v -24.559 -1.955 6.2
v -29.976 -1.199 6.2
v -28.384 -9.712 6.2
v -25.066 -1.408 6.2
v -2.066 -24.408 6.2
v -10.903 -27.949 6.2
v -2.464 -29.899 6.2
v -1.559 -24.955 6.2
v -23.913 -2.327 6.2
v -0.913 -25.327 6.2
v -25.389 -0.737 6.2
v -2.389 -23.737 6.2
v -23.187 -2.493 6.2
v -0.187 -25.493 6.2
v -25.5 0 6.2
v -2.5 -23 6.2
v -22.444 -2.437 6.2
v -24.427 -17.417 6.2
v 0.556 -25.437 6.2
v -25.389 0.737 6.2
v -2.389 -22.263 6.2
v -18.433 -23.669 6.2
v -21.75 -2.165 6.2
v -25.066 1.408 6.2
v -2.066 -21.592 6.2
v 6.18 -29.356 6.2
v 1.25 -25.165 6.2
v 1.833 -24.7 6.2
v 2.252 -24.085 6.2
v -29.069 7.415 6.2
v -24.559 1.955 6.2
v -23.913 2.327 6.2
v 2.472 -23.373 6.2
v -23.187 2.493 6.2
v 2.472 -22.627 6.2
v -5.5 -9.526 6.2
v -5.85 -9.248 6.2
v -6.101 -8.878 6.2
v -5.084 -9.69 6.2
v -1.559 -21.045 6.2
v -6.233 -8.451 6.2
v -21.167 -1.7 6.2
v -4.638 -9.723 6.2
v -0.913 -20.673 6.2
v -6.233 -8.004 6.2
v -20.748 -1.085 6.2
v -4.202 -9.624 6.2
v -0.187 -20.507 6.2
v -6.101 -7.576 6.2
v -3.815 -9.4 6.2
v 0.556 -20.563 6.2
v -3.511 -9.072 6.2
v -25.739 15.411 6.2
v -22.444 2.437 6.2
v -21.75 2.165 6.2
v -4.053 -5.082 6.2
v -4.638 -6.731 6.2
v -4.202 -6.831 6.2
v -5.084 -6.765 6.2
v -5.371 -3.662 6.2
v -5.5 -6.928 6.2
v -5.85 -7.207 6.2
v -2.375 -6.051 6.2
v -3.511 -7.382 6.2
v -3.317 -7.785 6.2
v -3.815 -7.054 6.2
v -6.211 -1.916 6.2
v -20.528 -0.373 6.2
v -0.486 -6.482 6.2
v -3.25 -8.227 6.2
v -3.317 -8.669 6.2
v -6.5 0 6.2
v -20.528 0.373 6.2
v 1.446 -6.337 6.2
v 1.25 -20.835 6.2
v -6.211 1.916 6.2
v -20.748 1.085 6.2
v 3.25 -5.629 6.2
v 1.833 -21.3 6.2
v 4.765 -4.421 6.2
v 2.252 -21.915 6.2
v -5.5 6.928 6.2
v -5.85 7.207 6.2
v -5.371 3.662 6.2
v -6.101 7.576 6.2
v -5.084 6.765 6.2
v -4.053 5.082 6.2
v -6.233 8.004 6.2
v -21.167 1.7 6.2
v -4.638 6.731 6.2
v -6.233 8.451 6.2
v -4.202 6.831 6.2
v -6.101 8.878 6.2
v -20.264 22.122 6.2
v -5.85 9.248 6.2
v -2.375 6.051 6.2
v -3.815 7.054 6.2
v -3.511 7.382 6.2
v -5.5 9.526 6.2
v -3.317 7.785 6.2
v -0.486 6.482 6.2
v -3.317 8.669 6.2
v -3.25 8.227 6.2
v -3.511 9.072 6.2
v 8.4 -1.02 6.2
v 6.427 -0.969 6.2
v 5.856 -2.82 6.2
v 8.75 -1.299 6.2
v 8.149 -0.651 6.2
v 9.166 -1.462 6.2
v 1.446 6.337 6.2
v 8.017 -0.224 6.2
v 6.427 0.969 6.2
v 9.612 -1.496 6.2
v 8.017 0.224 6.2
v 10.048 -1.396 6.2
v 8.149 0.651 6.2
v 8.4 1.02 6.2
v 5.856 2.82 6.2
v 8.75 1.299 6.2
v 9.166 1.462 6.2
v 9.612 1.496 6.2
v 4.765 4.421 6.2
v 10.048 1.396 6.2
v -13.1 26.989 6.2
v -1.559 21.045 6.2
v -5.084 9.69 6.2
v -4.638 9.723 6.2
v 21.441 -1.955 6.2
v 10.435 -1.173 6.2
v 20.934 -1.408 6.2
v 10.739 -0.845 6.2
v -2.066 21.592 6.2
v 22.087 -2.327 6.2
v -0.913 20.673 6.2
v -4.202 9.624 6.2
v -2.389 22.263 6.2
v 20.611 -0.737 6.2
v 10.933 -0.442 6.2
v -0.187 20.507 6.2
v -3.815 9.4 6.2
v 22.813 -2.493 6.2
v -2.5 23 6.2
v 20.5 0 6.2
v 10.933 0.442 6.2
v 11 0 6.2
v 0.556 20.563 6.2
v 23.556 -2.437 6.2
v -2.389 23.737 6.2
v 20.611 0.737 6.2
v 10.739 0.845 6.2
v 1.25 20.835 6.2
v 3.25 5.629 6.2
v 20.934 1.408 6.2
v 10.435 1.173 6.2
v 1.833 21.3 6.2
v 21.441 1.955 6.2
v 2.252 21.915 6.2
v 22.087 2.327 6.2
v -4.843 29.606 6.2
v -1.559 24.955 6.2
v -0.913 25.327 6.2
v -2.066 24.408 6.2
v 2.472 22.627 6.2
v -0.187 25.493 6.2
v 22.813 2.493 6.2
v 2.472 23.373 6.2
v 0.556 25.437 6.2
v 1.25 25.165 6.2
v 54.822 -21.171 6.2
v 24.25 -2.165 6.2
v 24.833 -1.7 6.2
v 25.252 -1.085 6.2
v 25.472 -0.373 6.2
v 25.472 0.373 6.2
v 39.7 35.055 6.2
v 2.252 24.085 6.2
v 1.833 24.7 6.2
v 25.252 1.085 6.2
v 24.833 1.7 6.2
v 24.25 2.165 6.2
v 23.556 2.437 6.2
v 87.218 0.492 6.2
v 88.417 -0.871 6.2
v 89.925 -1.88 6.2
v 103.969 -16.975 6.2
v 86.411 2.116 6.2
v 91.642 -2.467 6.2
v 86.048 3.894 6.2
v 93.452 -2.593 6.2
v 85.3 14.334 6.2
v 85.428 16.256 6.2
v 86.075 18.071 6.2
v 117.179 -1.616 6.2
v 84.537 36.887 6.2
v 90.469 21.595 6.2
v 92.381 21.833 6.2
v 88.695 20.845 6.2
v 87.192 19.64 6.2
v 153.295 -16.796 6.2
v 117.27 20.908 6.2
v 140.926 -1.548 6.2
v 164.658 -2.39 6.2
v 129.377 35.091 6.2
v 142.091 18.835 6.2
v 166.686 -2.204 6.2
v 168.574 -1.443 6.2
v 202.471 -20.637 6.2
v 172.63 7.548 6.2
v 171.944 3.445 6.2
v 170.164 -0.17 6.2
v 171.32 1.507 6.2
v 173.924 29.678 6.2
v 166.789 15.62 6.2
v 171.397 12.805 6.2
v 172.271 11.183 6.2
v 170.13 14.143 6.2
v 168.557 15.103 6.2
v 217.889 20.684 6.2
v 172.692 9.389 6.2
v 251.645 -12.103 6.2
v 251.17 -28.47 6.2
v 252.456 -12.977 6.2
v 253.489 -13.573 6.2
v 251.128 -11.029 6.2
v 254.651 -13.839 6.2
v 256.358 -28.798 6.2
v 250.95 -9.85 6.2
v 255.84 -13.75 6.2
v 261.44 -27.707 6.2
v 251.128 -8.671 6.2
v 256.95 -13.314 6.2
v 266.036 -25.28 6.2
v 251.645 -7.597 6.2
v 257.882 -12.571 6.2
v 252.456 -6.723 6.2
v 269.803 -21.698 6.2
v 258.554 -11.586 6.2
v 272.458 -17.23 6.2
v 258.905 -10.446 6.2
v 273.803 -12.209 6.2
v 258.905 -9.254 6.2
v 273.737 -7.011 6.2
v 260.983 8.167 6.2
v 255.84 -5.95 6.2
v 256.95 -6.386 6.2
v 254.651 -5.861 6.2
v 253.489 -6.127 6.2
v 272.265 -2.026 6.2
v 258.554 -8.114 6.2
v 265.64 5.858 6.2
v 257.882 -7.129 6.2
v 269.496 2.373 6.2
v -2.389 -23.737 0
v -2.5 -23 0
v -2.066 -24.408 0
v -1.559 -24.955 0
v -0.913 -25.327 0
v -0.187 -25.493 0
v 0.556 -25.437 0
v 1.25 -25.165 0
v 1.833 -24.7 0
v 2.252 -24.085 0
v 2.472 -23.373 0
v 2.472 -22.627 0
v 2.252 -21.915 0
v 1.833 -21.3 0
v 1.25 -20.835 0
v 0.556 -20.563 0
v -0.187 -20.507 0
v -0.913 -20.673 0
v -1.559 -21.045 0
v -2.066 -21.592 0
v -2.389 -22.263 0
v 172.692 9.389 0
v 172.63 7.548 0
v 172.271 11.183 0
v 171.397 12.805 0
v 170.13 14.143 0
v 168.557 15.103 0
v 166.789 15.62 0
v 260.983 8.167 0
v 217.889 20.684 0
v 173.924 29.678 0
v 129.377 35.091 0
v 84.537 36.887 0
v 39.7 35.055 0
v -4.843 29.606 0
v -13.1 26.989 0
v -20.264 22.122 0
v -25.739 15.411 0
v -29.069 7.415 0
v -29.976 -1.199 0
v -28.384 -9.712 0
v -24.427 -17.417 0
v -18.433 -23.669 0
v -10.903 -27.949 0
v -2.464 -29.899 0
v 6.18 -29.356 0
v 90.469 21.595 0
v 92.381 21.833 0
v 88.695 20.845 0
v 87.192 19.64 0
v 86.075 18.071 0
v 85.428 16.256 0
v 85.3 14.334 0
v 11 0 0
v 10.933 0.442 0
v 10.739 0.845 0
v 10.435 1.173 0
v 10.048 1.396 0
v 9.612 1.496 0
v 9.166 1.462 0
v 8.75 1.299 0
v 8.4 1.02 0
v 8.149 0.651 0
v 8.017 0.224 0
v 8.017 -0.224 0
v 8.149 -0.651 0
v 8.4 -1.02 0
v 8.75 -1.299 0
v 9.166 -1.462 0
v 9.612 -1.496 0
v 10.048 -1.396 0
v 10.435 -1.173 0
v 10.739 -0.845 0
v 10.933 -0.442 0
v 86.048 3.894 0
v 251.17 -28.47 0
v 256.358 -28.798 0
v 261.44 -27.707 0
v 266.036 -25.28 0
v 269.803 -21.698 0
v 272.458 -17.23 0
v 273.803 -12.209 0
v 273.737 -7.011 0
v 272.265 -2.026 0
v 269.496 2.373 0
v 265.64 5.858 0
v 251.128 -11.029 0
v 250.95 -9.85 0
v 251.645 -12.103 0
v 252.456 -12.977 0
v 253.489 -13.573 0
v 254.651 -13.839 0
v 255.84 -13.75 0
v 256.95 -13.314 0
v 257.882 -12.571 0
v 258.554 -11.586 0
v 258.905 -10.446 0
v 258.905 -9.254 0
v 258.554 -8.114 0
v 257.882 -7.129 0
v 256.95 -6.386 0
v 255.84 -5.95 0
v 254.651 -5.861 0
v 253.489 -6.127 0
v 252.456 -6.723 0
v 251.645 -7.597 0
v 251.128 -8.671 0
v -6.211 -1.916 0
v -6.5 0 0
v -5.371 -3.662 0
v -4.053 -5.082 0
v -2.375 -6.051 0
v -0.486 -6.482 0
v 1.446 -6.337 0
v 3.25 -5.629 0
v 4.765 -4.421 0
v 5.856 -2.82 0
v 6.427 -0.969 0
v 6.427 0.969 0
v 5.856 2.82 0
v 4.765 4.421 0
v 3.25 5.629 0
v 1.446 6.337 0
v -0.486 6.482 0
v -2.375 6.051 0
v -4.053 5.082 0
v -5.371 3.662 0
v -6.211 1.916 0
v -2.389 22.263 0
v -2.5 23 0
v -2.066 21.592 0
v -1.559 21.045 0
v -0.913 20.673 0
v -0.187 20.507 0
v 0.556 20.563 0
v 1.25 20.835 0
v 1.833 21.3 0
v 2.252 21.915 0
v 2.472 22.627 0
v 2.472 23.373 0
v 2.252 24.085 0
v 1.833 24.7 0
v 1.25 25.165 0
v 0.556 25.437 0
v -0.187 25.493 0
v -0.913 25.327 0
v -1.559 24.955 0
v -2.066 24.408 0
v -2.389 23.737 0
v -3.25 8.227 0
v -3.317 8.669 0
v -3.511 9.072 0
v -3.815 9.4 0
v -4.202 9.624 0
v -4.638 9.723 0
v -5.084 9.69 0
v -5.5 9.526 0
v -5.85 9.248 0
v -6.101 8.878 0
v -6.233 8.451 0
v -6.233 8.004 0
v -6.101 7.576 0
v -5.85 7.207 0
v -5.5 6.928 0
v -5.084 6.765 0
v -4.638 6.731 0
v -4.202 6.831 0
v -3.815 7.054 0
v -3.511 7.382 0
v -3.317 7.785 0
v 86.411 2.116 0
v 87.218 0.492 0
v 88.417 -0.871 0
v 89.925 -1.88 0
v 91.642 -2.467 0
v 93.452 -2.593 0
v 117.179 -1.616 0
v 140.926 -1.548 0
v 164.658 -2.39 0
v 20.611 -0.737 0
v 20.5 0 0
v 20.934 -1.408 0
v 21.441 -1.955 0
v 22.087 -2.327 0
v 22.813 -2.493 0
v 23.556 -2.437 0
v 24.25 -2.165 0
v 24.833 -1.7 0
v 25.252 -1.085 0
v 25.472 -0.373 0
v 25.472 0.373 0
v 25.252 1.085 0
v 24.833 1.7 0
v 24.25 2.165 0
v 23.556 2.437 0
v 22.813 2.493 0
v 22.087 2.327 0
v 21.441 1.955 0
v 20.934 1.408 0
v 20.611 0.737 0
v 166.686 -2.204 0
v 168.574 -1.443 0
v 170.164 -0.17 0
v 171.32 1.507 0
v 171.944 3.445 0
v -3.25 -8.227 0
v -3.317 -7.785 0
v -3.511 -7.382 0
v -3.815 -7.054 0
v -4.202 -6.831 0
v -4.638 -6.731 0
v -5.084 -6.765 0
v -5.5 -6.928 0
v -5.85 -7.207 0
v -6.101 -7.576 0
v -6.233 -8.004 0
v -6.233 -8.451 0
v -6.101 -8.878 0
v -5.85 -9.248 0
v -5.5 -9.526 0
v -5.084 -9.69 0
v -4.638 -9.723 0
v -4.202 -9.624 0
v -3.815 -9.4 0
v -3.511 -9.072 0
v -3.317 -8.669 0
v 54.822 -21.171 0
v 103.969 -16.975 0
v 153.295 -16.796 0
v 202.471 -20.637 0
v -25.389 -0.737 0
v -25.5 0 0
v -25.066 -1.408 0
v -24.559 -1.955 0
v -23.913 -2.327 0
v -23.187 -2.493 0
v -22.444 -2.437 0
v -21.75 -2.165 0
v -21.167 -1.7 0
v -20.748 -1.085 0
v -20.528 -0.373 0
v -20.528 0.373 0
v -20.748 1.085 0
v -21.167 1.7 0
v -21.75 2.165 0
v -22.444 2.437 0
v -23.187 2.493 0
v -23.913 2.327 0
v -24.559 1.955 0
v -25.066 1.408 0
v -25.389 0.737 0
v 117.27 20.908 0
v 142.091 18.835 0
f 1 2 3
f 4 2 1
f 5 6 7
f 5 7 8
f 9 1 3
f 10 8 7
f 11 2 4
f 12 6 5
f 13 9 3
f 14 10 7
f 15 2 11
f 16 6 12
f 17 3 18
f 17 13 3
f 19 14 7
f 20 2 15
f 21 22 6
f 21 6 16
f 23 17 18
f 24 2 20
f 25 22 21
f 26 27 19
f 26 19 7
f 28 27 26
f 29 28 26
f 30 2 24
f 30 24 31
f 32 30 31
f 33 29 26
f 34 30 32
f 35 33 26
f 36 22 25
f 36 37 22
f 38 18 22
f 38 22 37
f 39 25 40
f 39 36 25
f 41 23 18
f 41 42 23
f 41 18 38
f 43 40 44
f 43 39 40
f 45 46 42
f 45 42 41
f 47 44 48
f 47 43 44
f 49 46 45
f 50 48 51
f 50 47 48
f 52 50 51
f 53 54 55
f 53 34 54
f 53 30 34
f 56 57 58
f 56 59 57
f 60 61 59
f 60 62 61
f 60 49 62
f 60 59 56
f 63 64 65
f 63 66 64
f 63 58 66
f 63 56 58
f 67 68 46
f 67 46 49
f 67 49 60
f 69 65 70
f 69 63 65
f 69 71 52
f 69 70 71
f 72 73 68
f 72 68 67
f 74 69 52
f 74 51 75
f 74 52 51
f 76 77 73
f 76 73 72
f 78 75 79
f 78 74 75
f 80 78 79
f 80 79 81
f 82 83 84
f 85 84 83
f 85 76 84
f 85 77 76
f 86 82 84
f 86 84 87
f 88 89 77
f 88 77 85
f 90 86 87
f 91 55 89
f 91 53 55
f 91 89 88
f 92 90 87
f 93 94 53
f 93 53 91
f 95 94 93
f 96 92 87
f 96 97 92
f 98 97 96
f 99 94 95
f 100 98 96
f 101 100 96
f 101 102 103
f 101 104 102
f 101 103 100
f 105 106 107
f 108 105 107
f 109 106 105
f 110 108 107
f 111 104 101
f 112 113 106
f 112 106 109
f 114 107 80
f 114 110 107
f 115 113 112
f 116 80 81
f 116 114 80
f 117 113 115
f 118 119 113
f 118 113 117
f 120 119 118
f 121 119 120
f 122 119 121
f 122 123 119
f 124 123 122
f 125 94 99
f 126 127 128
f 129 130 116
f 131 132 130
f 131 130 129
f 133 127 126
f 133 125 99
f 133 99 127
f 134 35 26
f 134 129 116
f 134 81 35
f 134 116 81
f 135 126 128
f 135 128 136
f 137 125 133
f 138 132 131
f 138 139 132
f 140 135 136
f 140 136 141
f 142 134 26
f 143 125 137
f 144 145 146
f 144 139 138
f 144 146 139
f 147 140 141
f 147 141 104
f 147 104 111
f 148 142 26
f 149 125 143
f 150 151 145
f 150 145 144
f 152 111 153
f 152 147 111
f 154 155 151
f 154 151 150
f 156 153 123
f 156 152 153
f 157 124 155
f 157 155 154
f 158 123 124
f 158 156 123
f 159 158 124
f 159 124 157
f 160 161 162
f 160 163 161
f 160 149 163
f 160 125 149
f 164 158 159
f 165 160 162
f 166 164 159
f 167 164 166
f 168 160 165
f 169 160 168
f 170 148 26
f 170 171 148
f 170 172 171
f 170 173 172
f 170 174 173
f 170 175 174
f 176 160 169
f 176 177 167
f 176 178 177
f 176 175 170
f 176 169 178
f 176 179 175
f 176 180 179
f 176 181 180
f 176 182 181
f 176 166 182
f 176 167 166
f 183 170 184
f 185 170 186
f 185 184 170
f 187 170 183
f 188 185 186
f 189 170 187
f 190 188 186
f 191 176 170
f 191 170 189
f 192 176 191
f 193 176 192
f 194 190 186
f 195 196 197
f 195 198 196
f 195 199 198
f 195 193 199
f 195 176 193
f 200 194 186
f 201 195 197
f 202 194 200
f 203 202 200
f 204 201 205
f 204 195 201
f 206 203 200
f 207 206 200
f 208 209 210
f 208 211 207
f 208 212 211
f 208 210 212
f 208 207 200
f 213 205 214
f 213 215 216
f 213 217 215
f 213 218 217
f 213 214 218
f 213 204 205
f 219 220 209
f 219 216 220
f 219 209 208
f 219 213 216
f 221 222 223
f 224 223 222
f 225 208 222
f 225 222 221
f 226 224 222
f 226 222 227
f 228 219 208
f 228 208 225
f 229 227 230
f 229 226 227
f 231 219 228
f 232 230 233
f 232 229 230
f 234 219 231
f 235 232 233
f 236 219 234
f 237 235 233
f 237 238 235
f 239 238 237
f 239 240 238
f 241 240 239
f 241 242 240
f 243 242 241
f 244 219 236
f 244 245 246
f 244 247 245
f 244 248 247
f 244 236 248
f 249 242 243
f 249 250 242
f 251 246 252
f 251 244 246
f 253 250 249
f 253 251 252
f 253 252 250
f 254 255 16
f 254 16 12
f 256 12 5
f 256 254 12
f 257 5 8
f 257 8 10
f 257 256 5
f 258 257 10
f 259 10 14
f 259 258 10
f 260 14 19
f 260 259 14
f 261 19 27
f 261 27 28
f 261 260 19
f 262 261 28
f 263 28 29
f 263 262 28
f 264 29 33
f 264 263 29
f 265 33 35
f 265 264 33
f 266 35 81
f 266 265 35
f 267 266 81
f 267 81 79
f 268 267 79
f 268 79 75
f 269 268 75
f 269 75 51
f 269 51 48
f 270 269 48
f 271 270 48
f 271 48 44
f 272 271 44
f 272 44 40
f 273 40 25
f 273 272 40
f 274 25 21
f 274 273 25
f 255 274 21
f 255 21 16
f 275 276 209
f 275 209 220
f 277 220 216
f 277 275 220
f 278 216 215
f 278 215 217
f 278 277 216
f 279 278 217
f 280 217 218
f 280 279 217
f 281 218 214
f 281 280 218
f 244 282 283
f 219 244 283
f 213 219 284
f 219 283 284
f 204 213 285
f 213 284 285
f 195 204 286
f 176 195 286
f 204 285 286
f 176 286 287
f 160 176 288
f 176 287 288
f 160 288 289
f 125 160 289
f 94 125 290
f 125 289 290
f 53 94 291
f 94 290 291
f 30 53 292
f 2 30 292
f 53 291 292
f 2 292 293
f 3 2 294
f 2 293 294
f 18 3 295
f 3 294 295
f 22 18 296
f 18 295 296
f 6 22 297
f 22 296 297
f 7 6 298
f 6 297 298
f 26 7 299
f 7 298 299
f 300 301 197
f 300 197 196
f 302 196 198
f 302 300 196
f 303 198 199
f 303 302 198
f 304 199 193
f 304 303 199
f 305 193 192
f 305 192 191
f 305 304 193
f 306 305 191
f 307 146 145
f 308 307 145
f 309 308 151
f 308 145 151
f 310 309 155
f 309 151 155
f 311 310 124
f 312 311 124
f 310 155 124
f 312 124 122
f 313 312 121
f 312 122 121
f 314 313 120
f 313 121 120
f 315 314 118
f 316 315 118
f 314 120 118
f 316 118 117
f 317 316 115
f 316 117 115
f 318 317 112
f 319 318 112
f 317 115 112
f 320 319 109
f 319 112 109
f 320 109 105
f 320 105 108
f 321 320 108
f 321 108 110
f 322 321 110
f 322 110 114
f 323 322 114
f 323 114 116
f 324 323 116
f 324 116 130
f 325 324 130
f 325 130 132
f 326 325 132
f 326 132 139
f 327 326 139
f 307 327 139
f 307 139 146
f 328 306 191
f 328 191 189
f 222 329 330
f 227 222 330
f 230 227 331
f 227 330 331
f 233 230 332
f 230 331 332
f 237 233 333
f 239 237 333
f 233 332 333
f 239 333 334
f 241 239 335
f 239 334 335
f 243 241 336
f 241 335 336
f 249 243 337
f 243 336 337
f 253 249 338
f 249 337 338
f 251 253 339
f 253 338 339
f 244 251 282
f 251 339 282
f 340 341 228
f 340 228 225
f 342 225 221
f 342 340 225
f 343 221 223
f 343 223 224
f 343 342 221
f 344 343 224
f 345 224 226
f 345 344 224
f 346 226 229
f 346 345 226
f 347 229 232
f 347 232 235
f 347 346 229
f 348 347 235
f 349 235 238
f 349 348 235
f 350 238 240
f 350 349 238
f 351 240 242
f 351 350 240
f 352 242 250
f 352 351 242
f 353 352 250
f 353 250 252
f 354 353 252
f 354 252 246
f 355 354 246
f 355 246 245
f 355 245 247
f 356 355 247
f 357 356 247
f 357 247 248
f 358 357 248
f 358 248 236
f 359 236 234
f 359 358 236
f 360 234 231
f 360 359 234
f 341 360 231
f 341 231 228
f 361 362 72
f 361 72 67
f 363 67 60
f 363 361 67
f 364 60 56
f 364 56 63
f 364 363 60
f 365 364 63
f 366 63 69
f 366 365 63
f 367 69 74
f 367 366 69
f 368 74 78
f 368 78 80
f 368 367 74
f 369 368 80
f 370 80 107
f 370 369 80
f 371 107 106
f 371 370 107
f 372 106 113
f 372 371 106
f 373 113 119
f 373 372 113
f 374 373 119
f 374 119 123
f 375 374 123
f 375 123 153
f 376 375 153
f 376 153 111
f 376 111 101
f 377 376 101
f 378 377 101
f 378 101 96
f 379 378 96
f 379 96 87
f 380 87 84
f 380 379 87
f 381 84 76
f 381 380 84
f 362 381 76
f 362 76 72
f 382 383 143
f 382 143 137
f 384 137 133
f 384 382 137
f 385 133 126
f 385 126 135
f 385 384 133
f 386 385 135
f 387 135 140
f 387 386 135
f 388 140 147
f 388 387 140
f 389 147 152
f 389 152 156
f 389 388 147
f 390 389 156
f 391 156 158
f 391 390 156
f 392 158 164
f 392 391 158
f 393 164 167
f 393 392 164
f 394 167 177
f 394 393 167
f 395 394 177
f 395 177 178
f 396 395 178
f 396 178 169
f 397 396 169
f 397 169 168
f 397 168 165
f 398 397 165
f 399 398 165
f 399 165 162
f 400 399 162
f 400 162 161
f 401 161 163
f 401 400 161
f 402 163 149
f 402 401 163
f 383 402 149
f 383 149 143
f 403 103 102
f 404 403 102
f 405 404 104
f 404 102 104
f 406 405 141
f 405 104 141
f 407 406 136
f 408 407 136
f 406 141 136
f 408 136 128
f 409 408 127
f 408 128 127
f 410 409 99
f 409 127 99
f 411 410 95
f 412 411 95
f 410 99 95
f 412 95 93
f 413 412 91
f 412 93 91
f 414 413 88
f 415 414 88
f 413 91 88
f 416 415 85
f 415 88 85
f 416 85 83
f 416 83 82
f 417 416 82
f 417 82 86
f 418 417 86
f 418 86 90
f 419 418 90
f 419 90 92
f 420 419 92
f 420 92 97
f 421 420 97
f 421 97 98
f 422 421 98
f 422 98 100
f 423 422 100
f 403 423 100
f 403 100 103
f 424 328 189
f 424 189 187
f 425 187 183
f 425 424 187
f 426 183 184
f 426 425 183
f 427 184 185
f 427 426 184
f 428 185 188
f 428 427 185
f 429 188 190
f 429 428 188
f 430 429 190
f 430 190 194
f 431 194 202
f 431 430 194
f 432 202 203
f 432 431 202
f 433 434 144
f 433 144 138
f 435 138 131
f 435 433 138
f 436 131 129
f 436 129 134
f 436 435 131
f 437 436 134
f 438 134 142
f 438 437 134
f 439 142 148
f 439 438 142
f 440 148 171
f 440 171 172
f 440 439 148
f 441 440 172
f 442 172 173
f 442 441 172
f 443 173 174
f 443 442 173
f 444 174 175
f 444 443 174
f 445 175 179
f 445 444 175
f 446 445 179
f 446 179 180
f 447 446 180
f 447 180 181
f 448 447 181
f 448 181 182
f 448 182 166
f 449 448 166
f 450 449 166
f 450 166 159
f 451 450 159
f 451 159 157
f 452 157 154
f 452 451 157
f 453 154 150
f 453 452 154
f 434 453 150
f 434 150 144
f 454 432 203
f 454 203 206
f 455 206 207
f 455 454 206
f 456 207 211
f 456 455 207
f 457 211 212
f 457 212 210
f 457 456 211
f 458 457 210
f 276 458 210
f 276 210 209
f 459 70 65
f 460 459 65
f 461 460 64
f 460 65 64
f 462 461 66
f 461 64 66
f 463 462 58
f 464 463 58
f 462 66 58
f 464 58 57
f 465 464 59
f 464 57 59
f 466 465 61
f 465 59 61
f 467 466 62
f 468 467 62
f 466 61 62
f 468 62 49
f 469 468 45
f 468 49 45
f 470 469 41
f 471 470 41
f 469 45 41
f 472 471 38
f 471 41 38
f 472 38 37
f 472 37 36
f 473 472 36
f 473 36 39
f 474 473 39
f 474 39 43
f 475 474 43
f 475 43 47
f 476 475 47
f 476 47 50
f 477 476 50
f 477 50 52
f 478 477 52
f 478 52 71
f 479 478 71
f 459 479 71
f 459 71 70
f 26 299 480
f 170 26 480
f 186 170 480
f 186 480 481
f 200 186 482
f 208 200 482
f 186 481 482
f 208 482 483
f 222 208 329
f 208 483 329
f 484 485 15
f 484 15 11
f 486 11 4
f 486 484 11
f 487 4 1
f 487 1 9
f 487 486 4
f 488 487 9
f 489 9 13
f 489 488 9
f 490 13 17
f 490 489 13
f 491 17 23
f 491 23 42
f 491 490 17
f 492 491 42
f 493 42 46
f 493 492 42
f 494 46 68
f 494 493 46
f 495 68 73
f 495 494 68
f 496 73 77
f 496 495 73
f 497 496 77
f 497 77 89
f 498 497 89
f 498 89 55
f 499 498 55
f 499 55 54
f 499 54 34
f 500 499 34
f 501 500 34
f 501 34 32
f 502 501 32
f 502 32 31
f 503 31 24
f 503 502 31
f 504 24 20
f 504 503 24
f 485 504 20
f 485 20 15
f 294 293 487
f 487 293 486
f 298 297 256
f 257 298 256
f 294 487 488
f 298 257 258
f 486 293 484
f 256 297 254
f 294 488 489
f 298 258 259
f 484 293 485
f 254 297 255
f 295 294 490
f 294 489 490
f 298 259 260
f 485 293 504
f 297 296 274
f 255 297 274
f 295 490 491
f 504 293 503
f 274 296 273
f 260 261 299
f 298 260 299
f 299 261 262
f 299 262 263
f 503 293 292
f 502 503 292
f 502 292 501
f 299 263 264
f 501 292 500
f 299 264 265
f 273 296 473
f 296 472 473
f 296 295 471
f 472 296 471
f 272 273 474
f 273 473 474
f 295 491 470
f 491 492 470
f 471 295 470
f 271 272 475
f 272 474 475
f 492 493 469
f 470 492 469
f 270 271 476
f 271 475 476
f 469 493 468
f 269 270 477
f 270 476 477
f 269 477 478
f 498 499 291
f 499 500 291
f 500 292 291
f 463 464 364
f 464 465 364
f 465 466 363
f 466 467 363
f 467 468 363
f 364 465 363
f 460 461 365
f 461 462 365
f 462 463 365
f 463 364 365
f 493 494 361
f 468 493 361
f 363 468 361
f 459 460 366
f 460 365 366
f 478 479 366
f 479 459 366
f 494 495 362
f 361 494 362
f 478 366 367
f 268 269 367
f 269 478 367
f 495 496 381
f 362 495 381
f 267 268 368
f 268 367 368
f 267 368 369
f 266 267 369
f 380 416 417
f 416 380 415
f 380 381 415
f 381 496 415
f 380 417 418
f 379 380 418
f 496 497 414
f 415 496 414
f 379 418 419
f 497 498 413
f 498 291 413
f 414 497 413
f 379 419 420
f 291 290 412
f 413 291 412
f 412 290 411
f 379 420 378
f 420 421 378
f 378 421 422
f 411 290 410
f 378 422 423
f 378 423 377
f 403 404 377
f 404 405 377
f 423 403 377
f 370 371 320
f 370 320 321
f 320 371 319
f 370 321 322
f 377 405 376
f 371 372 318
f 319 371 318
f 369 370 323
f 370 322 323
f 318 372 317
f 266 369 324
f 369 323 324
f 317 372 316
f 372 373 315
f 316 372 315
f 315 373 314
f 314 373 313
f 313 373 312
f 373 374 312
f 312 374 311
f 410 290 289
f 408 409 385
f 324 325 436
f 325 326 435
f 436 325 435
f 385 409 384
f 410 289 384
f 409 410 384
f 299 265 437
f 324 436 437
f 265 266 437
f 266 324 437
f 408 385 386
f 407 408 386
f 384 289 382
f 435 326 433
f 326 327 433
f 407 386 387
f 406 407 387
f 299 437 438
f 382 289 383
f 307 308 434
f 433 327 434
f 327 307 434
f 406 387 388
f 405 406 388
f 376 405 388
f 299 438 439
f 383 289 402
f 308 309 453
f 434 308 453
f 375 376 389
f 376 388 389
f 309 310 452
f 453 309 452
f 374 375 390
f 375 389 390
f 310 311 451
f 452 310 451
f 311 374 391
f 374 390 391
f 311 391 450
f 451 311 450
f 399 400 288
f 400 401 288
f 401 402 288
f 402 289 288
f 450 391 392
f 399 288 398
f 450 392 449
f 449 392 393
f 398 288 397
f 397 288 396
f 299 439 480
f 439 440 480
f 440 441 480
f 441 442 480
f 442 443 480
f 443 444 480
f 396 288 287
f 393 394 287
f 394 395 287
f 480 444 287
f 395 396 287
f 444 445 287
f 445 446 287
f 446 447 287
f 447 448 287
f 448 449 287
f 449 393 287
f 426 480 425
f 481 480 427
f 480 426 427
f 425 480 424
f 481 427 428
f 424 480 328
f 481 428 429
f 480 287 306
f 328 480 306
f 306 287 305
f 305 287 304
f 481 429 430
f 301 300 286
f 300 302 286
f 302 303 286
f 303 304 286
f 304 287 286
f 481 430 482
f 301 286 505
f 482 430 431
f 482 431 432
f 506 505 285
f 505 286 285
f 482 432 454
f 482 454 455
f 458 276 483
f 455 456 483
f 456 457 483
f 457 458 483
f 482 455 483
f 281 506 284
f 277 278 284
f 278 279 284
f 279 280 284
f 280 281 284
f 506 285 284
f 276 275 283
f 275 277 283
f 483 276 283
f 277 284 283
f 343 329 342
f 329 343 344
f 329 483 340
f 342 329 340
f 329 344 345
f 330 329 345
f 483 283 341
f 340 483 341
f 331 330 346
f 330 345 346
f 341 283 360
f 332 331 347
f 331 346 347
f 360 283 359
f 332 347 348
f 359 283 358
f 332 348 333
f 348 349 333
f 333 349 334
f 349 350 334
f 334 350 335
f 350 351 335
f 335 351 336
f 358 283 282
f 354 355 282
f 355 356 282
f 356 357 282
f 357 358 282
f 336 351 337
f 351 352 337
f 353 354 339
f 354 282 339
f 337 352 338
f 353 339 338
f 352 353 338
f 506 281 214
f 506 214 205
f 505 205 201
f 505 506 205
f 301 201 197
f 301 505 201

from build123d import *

# Parameters (mm, degrees)
SKETCH1_R           = 4
SKETCH1_R_2         = 2.5
SKETCH1_R_3         = 6.5
BOSS_EXTRUDE1_DEPTH = 6.2
CUT_EXTRUDE1_REACH  = 278.492
SKETCH2_R           = 1.5


with BuildPart() as part:
    # Sketch1 → Boss-Extrude1 (new body)
    with BuildSketch(Plane.XY):
        with BuildLine():
            ThreePointArc((-4.843381354, 29.606446208), (-29.489039073, -5.513308858), (6.180402599, -29.356474988))
            ThreePointArc((6.180402599, -29.356474988), (128.63005147, -16.382678773), (251.170355628, -28.47026553))
            ThreePointArc((251.170355628, -28.47026553), (273.303133895, -14.765534175), (260.982883768, 8.166778664))
            ThreePointArc((260.982883768, 8.166778664), (129.376669821, 35.090841966), (-4.843381354, 29.606446208))
        make_face()
        with Locations(Location((254.95, -9.85, 0), (0, 0, 180))):
            Circle(SKETCH1_R, mode=Mode.SUBTRACT)
        with Locations(Location((0, 23, 0), (0, 0, 180))):
            Circle(SKETCH1_R_2, mode=Mode.SUBTRACT)
        with Locations(Location((0, -23, 0), (0, 0, 180))):
            Circle(SKETCH1_R_2, mode=Mode.SUBTRACT)
        with Locations(Location((-23, 0, 0), (0, 0, 180))):
            Circle(SKETCH1_R_2, mode=Mode.SUBTRACT)
        with Locations(Location((23, 0, 0), (0, 0, 180))):
            Circle(SKETCH1_R_2, mode=Mode.SUBTRACT)
        with Locations(Location((0, 0, 0), (0, 0, 180))):
            Circle(SKETCH1_R_3, mode=Mode.SUBTRACT)
        with BuildLine():
            Line((85.299988347, 14.334161591), (86.047515876, 3.894174942))
            ThreePointArc((86.047515876, 3.894174942), (88.416575223, -0.870831987), (93.451584576, -2.593160073))
            ThreePointArc((93.451584576, -2.593160073), (129.051714651, -1.468455886), (164.657677356, -2.390215498))
            ThreePointArc((164.657677356, -2.390215498), (169.415573807, -0.864394835), (171.943987902, 3.445225739))
            Line((171.943987902, 3.445225739), (172.629734019, 7.547504331))
            ThreePointArc((172.629734019, 7.547504331), (171.396804828, 12.804877005), (166.788880257, 15.62038992))
            ThreePointArc((166.788880257, 15.62038992), (129.692411097, 20.014503602), (92.380913243, 21.833400801))
            ThreePointArc((92.380913243, 21.833400801), (87.192448356, 19.639856576), (85.299988347, 14.334161591))
        make_face(mode=Mode.SUBTRACT)
    extrude(amount=BOSS_EXTRUDE1_DEPTH)

    # Sketch2 → Cut-Extrude1 (cut, up to next)
    with BuildSketch(Plane.XY.offset(6.2), mode=Mode.PRIVATE) as cut_extrude1_sk1:
        with Locations((-4.75, -8.227241336)):
            Circle(SKETCH2_R)
    cut_extrude1_tool1 = extrude(cut_extrude1_sk1.sketch, amount=-CUT_EXTRUDE1_REACH, mode=Mode.PRIVATE) & part.part
    # Sketch2 → Cut-Extrude1 (cut, up to next)
    with BuildSketch(Plane.XY.offset(6.2), mode=Mode.PRIVATE) as cut_extrude1_sk2:
        with Locations((-4.75, 8.227241336)):
            Circle(SKETCH2_R)
    cut_extrude1_tool2 = extrude(cut_extrude1_sk2.sketch, amount=-CUT_EXTRUDE1_REACH, mode=Mode.PRIVATE) & part.part
    # Sketch2 → Cut-Extrude1 (cut, up to next)
    with BuildSketch(Plane.XY.offset(6.2), mode=Mode.PRIVATE) as cut_extrude1_sk3:
        with Locations((9.5, 0)):
            Circle(SKETCH2_R)
    cut_extrude1_tool3 = extrude(cut_extrude1_sk3.sketch, amount=-CUT_EXTRUDE1_REACH, mode=Mode.PRIVATE) & part.part
    add(cut_extrude1_tool1.solids().sort_by_distance((-4.75, -8.227241, 6.2))[0], mode=Mode.SUBTRACT)
    add(cut_extrude1_tool2.solids().sort_by_distance((-4.75, 8.227241, 6.2))[0], mode=Mode.SUBTRACT)
    add(cut_extrude1_tool3.solids().sort_by_distance((9.5, 0, 6.2))[0], mode=Mode.SUBTRACT)


solid = part.part
